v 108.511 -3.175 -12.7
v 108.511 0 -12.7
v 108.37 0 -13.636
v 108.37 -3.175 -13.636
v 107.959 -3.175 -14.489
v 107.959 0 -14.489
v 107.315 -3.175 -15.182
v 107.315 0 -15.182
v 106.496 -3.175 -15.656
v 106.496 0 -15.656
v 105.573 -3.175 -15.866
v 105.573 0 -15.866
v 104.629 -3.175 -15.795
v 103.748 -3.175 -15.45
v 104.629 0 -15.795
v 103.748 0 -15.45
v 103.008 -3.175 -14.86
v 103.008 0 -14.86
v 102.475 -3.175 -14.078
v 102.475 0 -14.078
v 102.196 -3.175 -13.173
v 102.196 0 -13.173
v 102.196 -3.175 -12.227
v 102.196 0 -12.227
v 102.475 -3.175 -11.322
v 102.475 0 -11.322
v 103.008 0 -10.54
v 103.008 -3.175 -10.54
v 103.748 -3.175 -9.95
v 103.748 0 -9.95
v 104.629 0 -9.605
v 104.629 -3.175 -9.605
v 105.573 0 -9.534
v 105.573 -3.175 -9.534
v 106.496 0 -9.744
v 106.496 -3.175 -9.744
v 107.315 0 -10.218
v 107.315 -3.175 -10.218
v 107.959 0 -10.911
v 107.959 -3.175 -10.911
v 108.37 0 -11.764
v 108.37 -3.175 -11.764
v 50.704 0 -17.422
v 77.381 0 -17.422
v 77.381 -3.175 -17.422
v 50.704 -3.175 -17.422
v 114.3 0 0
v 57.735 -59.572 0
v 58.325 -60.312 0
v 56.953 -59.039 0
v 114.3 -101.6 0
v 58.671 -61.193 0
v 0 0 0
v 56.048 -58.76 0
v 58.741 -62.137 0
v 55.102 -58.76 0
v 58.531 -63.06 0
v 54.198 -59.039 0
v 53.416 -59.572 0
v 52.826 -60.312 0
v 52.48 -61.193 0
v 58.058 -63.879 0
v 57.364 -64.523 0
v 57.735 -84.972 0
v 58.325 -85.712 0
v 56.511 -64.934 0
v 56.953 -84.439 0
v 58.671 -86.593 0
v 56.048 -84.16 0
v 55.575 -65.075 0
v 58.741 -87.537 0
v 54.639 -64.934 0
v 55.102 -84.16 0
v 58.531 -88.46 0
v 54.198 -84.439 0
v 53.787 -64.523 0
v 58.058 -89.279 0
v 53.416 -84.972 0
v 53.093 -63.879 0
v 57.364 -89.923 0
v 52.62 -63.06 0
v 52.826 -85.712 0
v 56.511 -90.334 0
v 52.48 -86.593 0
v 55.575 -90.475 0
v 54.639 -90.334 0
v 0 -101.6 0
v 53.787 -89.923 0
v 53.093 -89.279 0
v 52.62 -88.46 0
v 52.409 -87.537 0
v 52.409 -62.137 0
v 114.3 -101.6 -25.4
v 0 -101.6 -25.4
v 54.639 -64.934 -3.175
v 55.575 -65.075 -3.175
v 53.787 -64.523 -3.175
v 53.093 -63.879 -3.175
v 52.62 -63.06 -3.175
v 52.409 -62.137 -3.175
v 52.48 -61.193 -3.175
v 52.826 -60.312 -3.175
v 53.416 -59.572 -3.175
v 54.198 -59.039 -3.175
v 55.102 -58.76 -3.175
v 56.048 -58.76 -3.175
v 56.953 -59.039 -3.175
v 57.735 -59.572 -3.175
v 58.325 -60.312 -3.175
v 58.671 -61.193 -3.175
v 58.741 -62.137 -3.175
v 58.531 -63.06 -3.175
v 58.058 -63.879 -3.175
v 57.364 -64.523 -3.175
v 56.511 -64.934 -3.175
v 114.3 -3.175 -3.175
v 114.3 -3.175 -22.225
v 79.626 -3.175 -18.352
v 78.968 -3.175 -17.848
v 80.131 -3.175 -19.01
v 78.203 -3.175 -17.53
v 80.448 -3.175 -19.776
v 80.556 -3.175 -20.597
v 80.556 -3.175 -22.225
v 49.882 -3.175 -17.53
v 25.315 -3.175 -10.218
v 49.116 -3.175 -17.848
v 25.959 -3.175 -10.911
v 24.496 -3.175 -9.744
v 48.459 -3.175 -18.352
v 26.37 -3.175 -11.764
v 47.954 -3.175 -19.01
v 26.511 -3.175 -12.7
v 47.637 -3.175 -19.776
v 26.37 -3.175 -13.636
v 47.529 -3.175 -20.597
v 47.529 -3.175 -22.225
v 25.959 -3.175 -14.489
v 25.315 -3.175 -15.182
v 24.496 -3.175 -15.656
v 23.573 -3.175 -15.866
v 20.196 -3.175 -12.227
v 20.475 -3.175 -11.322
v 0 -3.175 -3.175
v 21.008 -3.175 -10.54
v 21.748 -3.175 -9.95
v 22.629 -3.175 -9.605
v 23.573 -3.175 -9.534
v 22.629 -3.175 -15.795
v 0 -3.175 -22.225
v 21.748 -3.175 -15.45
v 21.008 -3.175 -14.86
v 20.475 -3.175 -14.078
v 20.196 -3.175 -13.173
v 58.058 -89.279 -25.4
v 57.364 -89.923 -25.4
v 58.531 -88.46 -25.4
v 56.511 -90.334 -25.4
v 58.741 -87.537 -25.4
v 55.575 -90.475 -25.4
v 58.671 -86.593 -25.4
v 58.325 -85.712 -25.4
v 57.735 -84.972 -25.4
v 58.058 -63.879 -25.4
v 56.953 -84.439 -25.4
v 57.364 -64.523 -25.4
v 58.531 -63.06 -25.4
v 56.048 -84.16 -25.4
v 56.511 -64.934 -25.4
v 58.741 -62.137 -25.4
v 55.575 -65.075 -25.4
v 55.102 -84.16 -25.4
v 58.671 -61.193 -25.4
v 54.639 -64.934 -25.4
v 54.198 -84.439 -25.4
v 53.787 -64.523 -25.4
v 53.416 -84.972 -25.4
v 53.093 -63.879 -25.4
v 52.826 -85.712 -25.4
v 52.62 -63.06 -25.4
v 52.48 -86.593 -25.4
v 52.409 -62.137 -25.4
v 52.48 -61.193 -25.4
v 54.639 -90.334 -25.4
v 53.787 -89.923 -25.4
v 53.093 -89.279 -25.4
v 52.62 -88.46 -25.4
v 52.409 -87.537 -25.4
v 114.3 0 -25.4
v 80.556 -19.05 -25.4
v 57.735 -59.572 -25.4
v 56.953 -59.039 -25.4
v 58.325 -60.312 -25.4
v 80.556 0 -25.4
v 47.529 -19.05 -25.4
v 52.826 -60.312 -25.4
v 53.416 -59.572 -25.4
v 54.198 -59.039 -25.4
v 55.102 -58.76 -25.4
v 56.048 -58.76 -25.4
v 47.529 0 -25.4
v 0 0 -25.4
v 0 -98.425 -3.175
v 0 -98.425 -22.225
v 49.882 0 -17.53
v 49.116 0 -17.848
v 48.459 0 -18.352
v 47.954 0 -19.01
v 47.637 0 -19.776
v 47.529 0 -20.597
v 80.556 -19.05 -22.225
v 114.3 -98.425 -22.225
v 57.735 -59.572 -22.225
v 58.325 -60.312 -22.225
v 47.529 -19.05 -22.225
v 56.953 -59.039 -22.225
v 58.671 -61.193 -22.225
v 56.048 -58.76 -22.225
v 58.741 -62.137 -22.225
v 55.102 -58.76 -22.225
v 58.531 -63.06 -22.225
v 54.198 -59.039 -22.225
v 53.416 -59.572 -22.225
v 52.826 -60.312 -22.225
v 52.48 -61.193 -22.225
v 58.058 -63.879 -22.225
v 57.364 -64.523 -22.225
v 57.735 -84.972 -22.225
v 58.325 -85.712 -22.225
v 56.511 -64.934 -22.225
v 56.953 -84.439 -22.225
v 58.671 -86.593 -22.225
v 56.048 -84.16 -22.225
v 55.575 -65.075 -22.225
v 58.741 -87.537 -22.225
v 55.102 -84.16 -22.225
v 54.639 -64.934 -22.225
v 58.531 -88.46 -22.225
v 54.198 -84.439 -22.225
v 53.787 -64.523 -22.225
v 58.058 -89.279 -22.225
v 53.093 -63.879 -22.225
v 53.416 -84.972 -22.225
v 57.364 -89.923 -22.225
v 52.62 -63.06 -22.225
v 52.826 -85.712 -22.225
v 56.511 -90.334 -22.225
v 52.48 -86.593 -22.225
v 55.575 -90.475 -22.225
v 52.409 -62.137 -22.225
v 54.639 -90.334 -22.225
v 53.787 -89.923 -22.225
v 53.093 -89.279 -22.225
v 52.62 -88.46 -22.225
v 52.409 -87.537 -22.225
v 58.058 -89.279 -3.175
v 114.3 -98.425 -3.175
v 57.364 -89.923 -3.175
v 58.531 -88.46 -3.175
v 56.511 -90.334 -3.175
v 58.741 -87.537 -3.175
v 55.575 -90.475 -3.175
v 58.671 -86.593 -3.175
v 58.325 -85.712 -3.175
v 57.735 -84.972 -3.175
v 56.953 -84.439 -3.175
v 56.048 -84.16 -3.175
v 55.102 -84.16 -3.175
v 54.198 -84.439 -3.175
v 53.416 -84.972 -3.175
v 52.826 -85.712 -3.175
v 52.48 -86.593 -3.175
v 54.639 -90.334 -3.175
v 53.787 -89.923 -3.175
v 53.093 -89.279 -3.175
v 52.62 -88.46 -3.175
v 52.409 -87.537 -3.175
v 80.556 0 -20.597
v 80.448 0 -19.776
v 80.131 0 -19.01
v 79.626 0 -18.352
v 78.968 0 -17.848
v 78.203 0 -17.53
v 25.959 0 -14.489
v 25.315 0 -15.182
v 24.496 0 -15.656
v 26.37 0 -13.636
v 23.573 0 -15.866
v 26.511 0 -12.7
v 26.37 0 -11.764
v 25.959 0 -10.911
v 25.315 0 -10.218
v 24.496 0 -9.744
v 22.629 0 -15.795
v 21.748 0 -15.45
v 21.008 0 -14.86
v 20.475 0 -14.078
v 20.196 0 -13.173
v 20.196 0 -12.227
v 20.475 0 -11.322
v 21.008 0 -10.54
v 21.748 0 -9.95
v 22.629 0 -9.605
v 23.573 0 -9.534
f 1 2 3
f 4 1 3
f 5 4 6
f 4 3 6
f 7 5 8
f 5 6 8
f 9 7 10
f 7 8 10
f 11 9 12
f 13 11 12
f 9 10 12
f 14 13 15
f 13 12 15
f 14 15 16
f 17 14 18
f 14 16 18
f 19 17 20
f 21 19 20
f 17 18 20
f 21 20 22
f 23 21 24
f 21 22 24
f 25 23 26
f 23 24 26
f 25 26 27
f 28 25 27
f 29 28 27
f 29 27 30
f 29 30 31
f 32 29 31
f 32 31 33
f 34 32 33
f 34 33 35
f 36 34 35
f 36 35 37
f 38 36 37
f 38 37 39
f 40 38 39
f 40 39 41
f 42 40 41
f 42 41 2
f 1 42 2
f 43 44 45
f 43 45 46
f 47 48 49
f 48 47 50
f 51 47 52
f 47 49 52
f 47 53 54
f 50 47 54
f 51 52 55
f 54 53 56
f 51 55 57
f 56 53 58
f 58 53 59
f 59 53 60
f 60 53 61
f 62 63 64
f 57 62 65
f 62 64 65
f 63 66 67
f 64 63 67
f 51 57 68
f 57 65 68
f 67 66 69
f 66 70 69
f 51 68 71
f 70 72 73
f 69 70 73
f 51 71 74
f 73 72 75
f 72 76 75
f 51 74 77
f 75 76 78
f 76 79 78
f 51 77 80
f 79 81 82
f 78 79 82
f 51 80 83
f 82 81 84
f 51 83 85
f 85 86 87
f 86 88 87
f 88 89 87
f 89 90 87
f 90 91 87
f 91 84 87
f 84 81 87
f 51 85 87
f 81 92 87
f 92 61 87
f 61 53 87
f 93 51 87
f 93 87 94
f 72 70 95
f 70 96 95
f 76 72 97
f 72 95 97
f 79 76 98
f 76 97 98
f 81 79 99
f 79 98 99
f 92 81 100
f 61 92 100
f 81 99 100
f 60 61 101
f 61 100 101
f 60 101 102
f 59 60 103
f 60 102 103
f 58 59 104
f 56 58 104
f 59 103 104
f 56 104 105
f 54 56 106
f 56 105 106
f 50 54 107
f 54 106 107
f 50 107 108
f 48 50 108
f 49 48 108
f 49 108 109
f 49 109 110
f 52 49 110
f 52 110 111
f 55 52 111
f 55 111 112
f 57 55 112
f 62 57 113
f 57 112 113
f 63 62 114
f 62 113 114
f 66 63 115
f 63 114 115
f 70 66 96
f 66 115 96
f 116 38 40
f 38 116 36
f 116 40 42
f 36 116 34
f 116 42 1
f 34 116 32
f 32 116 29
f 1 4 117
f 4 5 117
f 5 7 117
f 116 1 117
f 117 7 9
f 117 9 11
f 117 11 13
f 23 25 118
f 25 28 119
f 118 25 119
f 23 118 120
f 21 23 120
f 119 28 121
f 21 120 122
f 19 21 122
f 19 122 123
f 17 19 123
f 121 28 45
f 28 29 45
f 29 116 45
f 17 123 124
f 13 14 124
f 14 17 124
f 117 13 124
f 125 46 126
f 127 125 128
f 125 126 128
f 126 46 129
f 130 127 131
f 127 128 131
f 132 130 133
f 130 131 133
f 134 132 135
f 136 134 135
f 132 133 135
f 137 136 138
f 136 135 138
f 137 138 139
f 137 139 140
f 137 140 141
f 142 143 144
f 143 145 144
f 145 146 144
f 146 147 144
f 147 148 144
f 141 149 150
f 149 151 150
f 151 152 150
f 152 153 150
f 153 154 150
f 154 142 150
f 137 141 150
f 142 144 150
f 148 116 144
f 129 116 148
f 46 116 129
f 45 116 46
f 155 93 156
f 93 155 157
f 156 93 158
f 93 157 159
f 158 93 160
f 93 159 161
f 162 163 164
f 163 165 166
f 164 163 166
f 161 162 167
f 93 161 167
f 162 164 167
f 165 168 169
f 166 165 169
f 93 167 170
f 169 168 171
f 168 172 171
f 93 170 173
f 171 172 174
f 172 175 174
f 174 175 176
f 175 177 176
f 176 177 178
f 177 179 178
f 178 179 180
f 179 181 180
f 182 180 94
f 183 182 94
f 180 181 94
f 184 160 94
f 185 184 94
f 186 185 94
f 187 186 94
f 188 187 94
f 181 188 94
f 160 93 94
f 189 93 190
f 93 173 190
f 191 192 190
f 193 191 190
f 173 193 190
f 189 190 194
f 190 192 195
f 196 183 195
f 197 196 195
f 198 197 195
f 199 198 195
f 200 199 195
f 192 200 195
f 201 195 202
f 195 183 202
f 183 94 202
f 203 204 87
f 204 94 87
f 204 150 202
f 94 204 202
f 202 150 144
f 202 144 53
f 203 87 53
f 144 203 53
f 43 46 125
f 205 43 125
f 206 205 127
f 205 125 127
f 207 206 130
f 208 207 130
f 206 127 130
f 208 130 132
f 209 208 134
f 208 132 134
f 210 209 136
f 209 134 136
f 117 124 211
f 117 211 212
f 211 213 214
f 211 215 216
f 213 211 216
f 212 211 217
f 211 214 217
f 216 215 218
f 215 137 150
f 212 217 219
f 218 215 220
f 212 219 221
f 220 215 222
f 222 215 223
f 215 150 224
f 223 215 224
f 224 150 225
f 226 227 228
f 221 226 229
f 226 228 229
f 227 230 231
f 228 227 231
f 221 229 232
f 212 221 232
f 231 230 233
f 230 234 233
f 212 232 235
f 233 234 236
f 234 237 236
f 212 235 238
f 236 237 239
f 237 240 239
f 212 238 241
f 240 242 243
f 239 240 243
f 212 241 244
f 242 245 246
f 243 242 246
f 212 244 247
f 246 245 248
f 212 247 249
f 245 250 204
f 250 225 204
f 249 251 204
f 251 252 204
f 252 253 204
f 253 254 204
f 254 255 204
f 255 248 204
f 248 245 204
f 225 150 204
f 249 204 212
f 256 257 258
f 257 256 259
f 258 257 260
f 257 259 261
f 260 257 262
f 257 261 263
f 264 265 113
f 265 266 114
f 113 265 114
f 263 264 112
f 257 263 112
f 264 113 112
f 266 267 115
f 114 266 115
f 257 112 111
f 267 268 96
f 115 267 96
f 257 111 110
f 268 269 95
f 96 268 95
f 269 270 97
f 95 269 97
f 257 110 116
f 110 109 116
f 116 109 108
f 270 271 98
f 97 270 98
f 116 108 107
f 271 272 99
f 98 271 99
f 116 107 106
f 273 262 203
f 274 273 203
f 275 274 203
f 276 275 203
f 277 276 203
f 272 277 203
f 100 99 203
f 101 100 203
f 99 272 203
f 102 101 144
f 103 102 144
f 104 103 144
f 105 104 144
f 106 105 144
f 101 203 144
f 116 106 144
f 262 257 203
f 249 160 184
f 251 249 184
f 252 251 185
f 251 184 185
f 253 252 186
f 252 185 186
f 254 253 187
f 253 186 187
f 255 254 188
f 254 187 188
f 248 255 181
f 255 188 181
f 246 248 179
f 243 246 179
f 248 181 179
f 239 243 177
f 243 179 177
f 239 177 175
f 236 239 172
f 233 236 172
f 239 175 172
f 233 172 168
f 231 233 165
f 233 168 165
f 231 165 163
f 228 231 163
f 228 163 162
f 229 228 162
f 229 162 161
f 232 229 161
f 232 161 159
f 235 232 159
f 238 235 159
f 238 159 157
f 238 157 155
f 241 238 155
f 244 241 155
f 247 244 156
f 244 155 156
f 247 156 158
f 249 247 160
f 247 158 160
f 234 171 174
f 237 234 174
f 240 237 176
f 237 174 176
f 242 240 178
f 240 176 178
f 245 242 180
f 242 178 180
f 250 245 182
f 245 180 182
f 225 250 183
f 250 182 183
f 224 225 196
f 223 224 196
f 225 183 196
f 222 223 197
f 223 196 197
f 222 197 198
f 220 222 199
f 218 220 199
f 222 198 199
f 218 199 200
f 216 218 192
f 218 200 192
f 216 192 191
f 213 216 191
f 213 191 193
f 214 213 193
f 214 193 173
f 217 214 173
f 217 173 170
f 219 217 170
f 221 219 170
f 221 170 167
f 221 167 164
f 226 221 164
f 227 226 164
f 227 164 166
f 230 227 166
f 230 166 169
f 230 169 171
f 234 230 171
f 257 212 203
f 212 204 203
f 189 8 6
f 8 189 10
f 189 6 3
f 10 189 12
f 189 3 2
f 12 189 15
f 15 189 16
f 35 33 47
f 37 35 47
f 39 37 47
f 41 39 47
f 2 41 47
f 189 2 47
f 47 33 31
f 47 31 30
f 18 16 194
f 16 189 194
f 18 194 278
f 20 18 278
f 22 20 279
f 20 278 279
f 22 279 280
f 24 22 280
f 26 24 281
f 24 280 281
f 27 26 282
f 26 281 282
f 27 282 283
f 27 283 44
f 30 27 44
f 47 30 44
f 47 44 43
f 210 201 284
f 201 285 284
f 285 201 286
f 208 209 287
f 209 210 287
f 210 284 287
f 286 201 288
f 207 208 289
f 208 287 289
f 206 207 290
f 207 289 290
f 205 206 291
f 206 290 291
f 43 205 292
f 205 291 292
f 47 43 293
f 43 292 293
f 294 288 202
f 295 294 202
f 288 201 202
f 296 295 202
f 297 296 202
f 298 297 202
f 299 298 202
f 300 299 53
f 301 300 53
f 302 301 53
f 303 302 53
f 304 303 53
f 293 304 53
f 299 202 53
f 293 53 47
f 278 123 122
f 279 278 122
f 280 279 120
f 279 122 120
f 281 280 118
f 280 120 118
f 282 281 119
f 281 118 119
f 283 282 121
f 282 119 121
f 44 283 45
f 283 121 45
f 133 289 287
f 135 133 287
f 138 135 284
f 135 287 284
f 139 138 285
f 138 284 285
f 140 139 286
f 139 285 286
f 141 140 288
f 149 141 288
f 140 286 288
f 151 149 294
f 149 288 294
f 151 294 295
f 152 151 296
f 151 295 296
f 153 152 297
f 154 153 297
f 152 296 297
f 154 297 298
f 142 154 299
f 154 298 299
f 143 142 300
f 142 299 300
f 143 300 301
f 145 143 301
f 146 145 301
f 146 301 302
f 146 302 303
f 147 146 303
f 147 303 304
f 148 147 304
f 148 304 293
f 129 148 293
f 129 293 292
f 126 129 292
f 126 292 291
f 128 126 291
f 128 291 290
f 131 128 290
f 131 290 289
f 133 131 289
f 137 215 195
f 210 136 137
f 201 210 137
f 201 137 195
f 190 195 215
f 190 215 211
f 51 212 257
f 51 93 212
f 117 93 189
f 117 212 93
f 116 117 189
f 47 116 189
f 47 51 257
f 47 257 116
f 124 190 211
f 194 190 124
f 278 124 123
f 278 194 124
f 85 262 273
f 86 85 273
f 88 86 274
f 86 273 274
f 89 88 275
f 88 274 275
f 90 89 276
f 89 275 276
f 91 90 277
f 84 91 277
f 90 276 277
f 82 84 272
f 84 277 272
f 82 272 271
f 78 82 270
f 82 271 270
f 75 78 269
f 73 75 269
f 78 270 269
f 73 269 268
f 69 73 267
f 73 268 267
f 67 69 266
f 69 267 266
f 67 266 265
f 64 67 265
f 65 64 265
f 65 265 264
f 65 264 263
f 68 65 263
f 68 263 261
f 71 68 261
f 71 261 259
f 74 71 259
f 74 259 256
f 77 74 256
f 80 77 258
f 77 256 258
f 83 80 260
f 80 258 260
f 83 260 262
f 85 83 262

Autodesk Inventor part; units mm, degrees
ref_plane "YZ Plane" through (0, 0, 0) normal (1, 0, 0) x (0, 1, 0)
ref_plane "XZ Plane" through (0, 0, 0) normal (0, 1, 0) x (-1, 0, 0)
ref_plane "XY Plane" through (0, 0, 0) normal (0, 0, 1) x (1, 0, 0)
sketch "Sketch1" plane through (0, 0, 0) normal (1, 0, 0) x (0, 1, 0)
  line L0 (0, 0) -> (-101.6, 0)
  line L1 (-101.6, 0) -> (-101.6, -25.4)
  line L2 (-101.6, -25.4) -> (0, -25.4)
  line L3 (0, -25.4) -> (0, 0)
  line L4 (-3.175, -22.225) -> (-98.425, -22.225)
  line L5 (-98.425, -22.225) -> (-98.425, -3.175)
  line L6 (-98.425, -3.175) -> (-3.175, -3.175)
  line L7 (-3.175, -3.175) -> (-3.175, -22.225)
  dimension "d0" = 101.6
  dimension "d1" = 25.4
  dimension "d2" = 3.175
extrude "Extrusion1" add sketch "Sketch1" along normal blind 114.3
sketch "Sketch2" plane through (0, 0, 0) normal (0, 1, 0) x (1, 0, 0)
  line L0 (0, 25.4) -> (0, 0) projected
  line L1 (0, 0) -> (114.3, 0) projected
  line L2 (114.3, 25.4) -> (114.3, 0) projected
  line L3 (0, 25.4) -> (114.3, 25.4) projected
  circle A0 centre (64.3357, 49.9643) radius 6.35 projected
  circle A1 centre (64.3357, 49.9643) radius 28.3845 projected
extrude "Extrusion2" cut sketch "Sketch2" against normal blind 19.05 contours A1 L3 | L3 A1
sketch "Sketch3" plane through (0, 0, 0) normal (0, 1, 0) x (1, 0, 0)
  circle A0 centre (23.3357, 12.7) radius 3.175 projected
  circle A1 centre (105.3357, 12.7) radius 3.175 projected
  point P0 (0, 0)
extrude "Extrusion3" cut sketch "Sketch3" against normal blind 12.7
sketch "Sketch4" plane through (0, -101.6, 0) normal (0, 0, 1) x (1, 0, 0)
  point P0 (0, 101.6)
  point P1 (55.5752, 14.3002)
  point P2 (55.5752, 39.7002)
hole "Hole1" at (55.5752, -87.2998, 0) at (55.5752, -61.8998, 0) direction (0, 0, -1) diameter 6.35 end through all
sketch "Sketch5" plane through (0, 0, 0) normal (0, 1, 0) x (1, 0, 0)
  circle A0 centre (23.3357, 12.7) radius 3.175 projected
  circle A1 centre (105.3357, 12.7) radius 3.175 projected
  arc A2 (50.1134, 25.4) -> (78.5579, 25.4) centre (64.3357, 49.9643) ccw projected
  line L0 (0, 25.4) -> (50.1134, 25.4) projected
  line L1 (0, 25.4) -> (0, 0) projected
  line L2 (0, 0) -> (114.3, 0) projected
  line L3 (114.3, 25.4) -> (114.3, 0) projected
  line L4 (78.5579, 25.4) -> (114.3, 25.4) projected
  line L5 (0, 25.4) -> (50.1134, 25.4) projected
  line L6 (47.5287, 25.4) -> (80.556, 25.4)
  line L7 (80.556, 25.4) -> (80.556, 17.4223)
  line L8 (80.556, 17.4223) -> (47.5287, 17.4223)
  line L9 (47.5287, 17.4223) -> (47.5287, 25.4)
extrude "Extrusion4" cut sketch "Sketch5" against normal blind 19.05 contours L6 A2 | A2 L4 L7 L8 L9 L0
fillet "Fillet1" radius 3.175 1 edges at (47.5287, -1.5875, -17.4223)
fillet "Fillet2" radius 3.175 1 edges at (80.556, -1.5875, -17.4223)
properties part number "Front Fender BoxBeam"
